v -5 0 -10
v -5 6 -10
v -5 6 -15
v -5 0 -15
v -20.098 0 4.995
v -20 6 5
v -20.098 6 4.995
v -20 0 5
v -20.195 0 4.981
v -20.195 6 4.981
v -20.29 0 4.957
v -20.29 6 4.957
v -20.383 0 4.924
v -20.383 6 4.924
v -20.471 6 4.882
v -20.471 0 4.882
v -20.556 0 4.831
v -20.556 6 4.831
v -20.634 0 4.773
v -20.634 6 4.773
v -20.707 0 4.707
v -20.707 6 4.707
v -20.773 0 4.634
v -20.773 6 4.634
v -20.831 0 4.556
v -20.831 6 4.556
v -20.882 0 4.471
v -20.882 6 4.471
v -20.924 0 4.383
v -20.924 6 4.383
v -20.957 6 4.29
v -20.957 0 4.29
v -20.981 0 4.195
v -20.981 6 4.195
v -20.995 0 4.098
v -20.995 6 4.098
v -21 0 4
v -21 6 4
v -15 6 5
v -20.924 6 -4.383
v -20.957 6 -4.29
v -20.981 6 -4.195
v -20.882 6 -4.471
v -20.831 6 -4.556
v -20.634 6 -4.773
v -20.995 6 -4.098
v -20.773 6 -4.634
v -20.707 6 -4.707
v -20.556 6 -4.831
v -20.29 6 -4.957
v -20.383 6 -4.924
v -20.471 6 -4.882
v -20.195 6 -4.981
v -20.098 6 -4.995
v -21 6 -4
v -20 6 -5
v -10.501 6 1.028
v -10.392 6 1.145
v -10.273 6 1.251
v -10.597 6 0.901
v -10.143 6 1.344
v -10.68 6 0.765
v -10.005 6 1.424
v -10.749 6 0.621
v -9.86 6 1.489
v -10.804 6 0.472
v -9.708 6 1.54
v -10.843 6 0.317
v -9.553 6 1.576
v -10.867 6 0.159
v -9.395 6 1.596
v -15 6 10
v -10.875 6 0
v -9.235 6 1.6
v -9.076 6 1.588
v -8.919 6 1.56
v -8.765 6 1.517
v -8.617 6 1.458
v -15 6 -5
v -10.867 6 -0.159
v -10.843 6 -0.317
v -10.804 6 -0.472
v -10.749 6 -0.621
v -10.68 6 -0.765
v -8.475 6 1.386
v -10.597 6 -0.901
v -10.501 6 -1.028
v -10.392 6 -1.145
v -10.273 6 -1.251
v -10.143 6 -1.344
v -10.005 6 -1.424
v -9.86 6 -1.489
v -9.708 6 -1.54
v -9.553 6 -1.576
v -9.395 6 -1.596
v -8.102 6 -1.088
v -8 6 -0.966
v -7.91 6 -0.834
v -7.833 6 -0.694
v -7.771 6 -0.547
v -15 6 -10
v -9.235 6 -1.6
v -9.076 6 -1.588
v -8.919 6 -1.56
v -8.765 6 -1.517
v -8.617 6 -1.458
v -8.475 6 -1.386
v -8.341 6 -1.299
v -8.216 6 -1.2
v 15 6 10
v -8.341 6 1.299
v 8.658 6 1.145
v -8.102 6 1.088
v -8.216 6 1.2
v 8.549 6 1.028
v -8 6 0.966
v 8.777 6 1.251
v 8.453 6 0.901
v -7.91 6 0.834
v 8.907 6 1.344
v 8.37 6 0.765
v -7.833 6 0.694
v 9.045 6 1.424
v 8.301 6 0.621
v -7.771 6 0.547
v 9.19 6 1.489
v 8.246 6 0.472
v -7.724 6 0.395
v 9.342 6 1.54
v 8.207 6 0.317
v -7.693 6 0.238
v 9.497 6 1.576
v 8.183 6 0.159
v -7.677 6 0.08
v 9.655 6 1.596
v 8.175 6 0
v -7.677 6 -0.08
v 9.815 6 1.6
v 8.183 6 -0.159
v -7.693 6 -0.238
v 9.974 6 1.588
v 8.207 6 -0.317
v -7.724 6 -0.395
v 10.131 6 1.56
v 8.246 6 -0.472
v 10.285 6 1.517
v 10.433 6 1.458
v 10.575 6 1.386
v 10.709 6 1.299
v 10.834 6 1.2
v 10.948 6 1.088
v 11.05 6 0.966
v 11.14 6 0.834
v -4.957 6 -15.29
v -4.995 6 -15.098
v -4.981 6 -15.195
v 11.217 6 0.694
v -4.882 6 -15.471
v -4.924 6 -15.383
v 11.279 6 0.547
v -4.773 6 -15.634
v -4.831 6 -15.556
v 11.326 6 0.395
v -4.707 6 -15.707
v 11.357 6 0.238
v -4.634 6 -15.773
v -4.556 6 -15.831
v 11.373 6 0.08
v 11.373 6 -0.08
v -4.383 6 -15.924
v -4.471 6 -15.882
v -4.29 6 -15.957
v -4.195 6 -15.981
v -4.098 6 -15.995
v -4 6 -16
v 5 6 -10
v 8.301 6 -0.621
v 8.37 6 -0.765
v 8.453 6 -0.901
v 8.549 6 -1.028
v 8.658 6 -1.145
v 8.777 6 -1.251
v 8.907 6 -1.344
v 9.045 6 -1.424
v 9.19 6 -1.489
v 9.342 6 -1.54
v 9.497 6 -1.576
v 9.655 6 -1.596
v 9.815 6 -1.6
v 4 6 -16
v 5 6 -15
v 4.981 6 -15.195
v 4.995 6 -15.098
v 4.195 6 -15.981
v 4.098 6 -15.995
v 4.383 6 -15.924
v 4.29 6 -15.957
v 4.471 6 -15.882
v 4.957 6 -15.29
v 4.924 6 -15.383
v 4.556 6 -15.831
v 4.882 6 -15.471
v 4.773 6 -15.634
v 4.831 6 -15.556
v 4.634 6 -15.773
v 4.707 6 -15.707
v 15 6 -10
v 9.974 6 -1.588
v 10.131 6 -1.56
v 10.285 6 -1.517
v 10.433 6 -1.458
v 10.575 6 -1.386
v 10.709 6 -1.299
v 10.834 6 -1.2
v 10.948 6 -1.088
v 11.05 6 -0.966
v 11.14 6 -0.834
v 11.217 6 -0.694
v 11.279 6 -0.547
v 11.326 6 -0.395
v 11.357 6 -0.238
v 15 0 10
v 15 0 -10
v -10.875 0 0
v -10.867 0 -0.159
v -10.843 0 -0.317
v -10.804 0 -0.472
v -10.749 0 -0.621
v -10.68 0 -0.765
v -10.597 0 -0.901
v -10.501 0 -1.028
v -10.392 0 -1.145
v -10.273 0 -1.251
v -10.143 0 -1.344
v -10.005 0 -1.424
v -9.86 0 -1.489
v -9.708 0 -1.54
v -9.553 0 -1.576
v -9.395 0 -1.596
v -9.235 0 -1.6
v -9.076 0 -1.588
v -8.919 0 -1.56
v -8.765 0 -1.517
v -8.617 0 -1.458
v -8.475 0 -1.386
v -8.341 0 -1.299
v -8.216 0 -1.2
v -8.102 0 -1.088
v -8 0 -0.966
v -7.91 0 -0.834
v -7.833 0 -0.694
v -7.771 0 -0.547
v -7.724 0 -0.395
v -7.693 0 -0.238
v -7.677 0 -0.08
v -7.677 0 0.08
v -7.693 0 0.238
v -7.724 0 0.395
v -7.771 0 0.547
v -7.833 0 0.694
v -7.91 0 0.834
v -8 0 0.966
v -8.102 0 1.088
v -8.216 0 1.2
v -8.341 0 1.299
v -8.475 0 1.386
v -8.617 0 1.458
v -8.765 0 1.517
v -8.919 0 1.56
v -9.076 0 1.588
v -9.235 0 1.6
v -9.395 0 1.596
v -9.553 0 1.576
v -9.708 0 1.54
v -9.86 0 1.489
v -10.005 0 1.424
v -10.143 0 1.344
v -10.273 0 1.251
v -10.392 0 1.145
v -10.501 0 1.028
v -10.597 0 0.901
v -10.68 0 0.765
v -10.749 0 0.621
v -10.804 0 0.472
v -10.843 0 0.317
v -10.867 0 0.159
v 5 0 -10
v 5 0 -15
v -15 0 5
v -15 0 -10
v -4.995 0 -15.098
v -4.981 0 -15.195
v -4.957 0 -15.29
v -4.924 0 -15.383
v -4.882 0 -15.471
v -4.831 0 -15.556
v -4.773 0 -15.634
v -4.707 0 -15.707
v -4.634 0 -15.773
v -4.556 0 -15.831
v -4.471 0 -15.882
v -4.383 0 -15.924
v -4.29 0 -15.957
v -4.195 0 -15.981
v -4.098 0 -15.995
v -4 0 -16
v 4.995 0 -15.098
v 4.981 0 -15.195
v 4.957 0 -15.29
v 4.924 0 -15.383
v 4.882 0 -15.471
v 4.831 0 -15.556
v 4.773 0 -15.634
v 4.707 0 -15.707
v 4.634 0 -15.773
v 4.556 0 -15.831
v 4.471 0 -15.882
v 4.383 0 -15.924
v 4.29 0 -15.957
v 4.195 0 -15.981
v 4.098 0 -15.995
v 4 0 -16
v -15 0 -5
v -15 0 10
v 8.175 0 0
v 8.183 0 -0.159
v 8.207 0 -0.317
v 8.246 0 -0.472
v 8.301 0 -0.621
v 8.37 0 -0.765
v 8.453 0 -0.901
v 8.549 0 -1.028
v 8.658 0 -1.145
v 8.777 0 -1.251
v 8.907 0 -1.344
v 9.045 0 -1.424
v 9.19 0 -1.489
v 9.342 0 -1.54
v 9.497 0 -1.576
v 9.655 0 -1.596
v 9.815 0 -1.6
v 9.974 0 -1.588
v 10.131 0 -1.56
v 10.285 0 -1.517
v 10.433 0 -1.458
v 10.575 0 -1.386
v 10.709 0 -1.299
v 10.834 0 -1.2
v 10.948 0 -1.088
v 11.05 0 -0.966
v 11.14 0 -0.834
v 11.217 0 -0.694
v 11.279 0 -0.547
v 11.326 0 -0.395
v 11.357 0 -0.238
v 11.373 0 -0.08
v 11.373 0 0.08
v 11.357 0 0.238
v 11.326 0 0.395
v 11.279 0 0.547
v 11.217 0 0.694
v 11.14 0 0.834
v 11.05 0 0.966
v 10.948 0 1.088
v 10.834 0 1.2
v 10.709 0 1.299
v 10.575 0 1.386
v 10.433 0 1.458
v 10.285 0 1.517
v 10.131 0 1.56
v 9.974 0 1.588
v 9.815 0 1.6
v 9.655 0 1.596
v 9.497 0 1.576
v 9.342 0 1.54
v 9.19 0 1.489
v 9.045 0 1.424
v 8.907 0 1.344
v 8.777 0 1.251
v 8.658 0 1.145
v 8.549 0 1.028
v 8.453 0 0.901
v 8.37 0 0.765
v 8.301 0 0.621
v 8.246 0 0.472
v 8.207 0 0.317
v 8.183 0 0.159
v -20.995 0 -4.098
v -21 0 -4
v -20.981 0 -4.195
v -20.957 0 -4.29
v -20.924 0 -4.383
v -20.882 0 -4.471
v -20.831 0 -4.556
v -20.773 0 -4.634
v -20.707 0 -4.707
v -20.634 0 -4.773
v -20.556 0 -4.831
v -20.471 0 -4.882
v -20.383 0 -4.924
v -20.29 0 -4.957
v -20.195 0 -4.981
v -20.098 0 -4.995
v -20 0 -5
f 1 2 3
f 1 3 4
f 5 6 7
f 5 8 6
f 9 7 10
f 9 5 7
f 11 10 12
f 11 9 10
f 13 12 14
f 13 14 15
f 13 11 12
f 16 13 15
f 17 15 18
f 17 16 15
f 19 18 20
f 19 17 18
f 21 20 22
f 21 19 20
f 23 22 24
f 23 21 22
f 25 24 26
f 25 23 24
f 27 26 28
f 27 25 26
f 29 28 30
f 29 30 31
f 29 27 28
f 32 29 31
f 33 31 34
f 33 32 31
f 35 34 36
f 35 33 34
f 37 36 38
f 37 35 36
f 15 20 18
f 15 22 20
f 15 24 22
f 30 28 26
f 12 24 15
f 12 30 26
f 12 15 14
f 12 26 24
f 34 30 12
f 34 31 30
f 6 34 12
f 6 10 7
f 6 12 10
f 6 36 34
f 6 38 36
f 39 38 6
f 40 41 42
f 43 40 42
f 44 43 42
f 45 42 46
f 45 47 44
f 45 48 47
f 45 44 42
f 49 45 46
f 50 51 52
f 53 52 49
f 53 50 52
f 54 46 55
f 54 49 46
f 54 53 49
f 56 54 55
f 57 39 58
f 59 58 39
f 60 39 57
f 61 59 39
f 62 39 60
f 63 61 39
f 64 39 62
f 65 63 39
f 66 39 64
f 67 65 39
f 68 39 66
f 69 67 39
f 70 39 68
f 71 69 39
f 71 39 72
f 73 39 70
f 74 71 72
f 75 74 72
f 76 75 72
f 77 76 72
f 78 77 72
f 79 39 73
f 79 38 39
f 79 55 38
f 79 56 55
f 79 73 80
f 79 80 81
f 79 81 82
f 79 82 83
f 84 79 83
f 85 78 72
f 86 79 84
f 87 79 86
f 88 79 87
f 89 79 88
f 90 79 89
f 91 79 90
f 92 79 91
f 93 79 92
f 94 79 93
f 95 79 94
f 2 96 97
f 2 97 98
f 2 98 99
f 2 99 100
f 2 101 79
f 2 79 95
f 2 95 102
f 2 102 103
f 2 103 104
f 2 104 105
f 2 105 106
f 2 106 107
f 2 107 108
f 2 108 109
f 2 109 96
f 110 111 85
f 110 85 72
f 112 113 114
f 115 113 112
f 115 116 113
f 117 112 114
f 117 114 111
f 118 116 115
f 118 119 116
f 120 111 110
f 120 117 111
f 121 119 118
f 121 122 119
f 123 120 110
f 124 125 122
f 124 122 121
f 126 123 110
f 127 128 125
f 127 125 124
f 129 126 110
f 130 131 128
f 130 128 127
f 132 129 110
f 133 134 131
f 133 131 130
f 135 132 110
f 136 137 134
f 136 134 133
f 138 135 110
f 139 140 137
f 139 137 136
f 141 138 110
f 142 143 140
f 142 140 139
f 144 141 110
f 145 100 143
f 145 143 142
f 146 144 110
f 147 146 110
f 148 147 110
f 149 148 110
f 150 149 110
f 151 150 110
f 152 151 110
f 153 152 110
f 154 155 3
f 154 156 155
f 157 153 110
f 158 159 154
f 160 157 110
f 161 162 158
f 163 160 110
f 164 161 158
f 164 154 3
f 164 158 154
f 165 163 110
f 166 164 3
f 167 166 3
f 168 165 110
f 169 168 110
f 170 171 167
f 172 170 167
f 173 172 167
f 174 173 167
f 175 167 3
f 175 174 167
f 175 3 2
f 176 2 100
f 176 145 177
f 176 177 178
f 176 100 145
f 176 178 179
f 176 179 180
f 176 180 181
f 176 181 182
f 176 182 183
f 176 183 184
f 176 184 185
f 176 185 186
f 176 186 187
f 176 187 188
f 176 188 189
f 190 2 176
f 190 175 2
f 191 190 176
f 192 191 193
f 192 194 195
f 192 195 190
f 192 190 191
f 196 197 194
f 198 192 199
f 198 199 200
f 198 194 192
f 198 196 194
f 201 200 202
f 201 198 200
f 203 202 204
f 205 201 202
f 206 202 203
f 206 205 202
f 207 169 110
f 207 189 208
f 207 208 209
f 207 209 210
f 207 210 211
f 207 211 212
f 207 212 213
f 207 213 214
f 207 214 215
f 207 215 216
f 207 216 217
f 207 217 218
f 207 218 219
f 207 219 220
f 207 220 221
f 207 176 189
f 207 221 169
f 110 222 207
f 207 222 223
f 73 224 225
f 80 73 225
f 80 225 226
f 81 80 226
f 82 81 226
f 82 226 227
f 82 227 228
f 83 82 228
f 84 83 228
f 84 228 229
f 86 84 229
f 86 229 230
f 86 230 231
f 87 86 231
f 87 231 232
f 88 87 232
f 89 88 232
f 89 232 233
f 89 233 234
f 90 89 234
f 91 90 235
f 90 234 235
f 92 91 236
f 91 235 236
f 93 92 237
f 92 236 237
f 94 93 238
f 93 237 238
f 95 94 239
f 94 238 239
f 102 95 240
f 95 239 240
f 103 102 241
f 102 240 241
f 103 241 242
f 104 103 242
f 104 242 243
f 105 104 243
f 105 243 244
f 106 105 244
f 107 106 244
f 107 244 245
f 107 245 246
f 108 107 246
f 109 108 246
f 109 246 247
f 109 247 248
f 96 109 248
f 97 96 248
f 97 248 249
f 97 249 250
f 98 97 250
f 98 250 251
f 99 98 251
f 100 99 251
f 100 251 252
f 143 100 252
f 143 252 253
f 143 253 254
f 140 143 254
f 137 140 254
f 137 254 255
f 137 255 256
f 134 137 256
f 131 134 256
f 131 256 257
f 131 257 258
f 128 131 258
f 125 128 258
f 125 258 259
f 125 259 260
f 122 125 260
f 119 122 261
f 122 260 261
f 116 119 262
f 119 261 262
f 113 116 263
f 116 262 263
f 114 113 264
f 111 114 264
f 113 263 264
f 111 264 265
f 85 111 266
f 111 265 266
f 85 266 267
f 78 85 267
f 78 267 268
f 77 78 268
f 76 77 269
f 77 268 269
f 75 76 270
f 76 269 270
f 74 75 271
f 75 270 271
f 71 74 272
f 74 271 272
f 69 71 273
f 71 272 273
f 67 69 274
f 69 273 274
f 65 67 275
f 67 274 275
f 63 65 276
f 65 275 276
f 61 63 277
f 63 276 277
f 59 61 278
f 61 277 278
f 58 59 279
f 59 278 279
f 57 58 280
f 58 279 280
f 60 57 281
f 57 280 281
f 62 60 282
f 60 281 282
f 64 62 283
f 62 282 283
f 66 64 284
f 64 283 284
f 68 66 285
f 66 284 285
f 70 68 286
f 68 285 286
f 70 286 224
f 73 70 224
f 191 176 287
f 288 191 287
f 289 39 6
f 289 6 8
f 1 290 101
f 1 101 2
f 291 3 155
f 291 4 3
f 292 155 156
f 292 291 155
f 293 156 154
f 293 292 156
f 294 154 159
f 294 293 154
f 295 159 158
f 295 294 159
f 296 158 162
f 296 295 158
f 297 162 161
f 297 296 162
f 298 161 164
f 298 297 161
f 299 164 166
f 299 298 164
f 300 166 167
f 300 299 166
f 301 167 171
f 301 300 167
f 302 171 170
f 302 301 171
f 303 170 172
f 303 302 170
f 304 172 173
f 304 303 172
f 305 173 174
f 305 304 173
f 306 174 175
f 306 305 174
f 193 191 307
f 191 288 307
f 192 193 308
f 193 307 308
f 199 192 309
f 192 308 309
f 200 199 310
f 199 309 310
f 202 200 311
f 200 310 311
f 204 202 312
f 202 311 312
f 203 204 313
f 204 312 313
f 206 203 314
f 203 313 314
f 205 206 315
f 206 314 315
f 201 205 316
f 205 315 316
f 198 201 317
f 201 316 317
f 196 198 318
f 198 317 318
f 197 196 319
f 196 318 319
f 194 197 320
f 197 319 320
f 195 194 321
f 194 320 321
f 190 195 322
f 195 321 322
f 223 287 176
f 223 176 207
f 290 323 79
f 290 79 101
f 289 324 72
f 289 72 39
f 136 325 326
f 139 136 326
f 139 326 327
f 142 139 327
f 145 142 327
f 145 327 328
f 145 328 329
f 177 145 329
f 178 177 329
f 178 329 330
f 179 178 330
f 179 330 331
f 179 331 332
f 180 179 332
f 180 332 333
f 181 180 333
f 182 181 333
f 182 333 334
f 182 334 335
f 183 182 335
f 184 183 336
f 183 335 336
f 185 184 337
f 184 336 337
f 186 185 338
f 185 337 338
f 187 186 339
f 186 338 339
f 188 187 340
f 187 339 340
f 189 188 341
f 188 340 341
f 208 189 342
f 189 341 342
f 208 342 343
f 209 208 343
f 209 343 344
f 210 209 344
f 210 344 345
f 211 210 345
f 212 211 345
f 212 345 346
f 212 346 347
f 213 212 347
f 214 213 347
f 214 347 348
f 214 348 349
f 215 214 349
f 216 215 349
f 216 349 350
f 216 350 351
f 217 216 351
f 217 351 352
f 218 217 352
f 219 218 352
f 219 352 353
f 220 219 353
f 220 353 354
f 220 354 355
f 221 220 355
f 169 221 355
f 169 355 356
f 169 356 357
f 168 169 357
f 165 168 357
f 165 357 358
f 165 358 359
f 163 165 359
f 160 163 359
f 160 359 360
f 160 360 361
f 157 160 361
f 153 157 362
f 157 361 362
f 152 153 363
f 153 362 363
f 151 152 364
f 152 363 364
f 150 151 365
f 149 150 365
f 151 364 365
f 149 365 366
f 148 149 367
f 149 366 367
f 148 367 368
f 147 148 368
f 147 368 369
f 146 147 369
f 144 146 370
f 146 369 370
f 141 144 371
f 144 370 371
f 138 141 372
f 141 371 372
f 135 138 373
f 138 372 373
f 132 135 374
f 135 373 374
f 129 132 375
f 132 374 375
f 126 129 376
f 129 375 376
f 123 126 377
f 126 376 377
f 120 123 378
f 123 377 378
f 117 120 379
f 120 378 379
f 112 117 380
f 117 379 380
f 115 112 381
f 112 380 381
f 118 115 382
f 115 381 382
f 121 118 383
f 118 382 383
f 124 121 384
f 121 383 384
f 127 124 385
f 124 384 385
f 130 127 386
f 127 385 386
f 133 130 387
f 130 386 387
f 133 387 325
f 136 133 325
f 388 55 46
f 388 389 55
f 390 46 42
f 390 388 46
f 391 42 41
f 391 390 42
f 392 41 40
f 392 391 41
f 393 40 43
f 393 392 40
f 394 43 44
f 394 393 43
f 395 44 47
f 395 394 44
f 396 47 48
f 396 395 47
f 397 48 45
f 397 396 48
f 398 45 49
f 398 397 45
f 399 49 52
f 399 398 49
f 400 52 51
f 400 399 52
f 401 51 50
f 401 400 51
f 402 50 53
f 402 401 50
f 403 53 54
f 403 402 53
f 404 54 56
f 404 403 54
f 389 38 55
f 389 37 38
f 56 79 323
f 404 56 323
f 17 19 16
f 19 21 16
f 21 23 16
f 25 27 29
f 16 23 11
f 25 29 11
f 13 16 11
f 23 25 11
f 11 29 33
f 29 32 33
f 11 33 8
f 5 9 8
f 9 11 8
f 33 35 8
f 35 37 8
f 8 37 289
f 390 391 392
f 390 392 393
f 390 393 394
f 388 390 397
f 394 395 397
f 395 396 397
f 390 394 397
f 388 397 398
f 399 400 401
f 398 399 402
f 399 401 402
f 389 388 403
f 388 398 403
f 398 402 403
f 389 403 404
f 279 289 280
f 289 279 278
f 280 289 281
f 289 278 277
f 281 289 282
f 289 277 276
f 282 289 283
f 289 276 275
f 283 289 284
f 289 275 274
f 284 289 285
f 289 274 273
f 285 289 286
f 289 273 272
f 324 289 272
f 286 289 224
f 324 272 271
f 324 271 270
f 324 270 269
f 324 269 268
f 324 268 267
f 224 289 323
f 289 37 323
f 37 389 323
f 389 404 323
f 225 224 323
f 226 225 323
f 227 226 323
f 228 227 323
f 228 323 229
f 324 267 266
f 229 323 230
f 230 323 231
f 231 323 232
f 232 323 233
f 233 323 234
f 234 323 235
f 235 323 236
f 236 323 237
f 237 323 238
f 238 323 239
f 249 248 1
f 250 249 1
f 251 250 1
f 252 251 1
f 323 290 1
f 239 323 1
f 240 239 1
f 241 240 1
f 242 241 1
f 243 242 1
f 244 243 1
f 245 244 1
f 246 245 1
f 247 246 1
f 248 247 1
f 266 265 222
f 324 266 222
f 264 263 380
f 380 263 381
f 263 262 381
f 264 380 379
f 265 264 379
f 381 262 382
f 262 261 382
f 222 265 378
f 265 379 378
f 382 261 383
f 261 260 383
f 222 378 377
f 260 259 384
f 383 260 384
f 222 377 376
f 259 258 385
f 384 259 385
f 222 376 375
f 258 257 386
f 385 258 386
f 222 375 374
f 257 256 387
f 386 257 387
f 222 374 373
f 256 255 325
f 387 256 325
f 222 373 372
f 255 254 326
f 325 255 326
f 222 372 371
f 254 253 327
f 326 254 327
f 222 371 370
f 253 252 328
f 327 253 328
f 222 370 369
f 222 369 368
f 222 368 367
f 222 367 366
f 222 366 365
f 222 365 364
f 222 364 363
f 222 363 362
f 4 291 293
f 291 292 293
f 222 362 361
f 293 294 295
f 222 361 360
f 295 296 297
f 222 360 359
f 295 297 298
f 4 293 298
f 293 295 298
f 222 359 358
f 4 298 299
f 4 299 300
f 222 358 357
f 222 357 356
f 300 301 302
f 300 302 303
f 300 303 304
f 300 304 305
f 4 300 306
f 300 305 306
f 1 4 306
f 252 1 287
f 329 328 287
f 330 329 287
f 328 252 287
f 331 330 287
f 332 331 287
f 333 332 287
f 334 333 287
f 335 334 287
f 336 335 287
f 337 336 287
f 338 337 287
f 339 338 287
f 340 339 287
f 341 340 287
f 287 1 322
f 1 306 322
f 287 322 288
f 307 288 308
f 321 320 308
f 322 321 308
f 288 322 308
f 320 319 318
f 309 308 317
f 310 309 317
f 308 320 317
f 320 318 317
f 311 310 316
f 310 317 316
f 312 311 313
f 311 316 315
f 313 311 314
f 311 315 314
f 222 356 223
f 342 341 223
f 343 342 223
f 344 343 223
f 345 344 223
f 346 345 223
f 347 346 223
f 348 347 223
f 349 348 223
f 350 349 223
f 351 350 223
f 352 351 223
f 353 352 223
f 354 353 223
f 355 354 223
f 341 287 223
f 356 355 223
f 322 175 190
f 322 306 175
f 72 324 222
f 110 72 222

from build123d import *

# Parameters (mm, degrees)
SKETCH1_W              = 30
SKETCH1_H              = 20
BOSS_EXTRUDE1_DEPTH    = 6
M3_CLEARANCE_HOLE1_D   = 3.2
SKETCH234_W            = 10
SKETCH234_H            = 6
BOSS_EXTRUDE234_DEPTH  = 6
FILLET134_R            = 1
SKETCH2342_W           = 10
SKETCH2342_H           = 6
BOSS_EXTRUDE2342_DEPTH = 6
FILLET1342_R           = 1


with BuildPart() as part:
    # Sketch1 → Boss-Extrude1 (new body)
    with BuildSketch(Plane(origin=(0, 0, 0), x_dir=(1, 0, 0), z_dir=(0, 1, 0))):
        Rectangle(SKETCH1_W, SKETCH1_H)
    extrude(amount=BOSS_EXTRUDE1_DEPTH)

    # M3 Clearance Hole1 (through all)
    with Locations(Plane(origin=(0, 6, 0), x_dir=(1, 0, 0), z_dir=(0, 1, 0))):
        with Locations((-9.275, 0), (9.775, 0)):
            Hole(M3_CLEARANCE_HOLE1_D / 2)

    # Sketch234 → Boss-Extrude234 (add)
    with BuildSketch(Plane(origin=(-15, 6, 0.767778608), x_dir=(0, 0, -1), z_dir=(-1, 0, 0))):
        with Locations((0.767778608, 3)):
            Rectangle(SKETCH234_W, SKETCH234_H)
    extrude(amount=BOSS_EXTRUDE234_DEPTH)

    # Fillet134
    fillet134_edges = [part.edges().sort_by_distance(p)[0] for p in [
        (-21, 3, 5),
        (-21, 3, -5),
    ]]
    fillet(fillet134_edges, radius=FILLET134_R)

    # Sketch2342 → Boss-Extrude2342 (add)
    with BuildSketch(Plane(origin=(-0.767778608, 6, -10), x_dir=(1, 0, 0), z_dir=(0, 0, -1))):
        with Locations((0.767778608, 3)):
            Rectangle(SKETCH2342_W, SKETCH2342_H)
    extrude(amount=BOSS_EXTRUDE2342_DEPTH)

    # Fillet1342
    fillet1342_edges = [part.edges().sort_by_distance(p)[0] for p in [
        (-5, 3, -16),
        (5, 3, -16),
    ]]
    fillet(fillet1342_edges, radius=FILLET1342_R)


solid = part.part
